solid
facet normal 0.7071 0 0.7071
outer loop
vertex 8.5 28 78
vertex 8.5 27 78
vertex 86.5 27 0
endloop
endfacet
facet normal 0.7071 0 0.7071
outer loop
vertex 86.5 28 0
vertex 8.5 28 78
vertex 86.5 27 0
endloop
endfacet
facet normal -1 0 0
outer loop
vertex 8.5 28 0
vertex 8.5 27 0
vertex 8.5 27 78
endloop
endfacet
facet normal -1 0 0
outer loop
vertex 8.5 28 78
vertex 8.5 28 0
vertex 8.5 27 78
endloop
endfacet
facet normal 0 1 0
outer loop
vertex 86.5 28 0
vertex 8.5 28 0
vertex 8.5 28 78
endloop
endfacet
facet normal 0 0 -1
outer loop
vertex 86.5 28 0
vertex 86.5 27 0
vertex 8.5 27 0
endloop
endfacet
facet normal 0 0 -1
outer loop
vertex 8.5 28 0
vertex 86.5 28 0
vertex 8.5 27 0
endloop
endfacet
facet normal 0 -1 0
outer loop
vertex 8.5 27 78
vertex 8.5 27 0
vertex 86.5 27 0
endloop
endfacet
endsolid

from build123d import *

# Parameters (mm, degrees)
BOSS_EXTRUDE1_DEPTH   = 327.5
BOSS_EXTRUDE1_2_DEPTH = 327.5
BOSS_EXTRUDE2_DEPTH   = 2
BOSS_EXTRUDE4_DEPTH   = 1
SKETCH4_W             = 100
SKETCH4_H             = 8.5
BOSS_EXTRUDE5_DEPTH   = 2
BOSS_EXTRUDE6_DEPTH   = 1
SKETCH7_R             = 5
SKETCH7_W             = 96
SKETCH7_H             = 1
CUT_EXTRUDE2_DEPTH    = 1
SKETCH8_W             = 100
SKETCH8_H             = 13.5
CUT_EXTRUDE3_DEPTH    = 400
SKETCH9_W             = 1
SKETCH9_H             = 5
CUT_EXTRUDE4_DEPTH    = 84.5
BOSS_EXTRUDE8_DEPTH   = 1
SKETCH15_W            = 110.261376908
SKETCH15_H            = 36.265100391
CUT_EXTRUDE7_DEPTH    = 400


with BuildPart() as part:
    # Sketch1 → Boss-Extrude1 (new body)
    with BuildSketch(Plane.XY):
        Polygon((0, 0), (0, 8.5), (1, 8.5), (1, 13.5), (2, 13.5), (2, 2), (13.5, 2), (13.5, 1), (8.5, 1), (8.5, 0), align=None)
    extrude(amount=BOSS_EXTRUDE1_DEPTH)



with BuildPart() as body_2:
    # Sketch1 → Boss-Extrude1 2 (new body)
    with BuildSketch(Plane.XY):
        Polygon((100, 0), (91.5, 0), (91.5, 1), (86.5, 1), (86.5, 2), (98, 2), (98, 13.5), (99, 13.5), (99, 8.5), (100, 8.5), align=None)
    extrude(amount=BOSS_EXTRUDE1_2_DEPTH)


with BuildPart() as part_1:
    add(part.part)

    add(body_2.part)  # Boss-Extrude2 merges body 2
    # Sketch2 → Boss-Extrude2 (add)
    with BuildSketch(Plane(origin=(0, 2, 0), x_dir=(1, 0, 0), z_dir=(0, 1, 0))):
        Polygon((86.5, 0), (13.5, -73), (13.5, -85.02081528), (86.5, -12.02081528), align=None)
    extrude(amount=-BOSS_EXTRUDE2_DEPTH)

    # Sketch3 → Boss-Extrude4 (add)
    with BuildSketch(Plane.XZ.offset(-1)):
        Polygon((13.5, 73), (13.5, 85.02081528), (8.5, 90.02081528), (8.5, 78), align=None)
        Polygon((86.5, 0), (86.5, 12.02081528), (91.5, 7.02081528), (91.5, 0), align=None)
    extrude(amount=BOSS_EXTRUDE4_DEPTH)

    # Sketch4 → Boss-Extrude5 (add)
    with BuildSketch(Plane.XZ):
        with Locations((50, 323.25)):
            Rectangle(SKETCH4_W, SKETCH4_H)
    extrude(amount=-BOSS_EXTRUDE5_DEPTH)

    # Sketch7 → Cut-Extrude2 (cut)
    with BuildSketch(Plane(origin=(0, 2, 0), x_dir=(1, 0, 0), z_dir=(0, 1, 0))):
        with Locations((26.5, -326.5)):
            Circle(SKETCH7_R)
        with Locations((73.5, -326.5)):
            Circle(SKETCH7_R)
        with Locations((50, -327)):
            Rectangle(SKETCH7_W, SKETCH7_H)
    extrude(amount=-CUT_EXTRUDE2_DEPTH, mode=Mode.SUBTRACT)


with BuildPart() as body_2_2:
    # Sketch5 → Boss-Extrude6 (new body)
    with BuildSketch(Plane(origin=(0, 2, 0), x_dir=(1, 0, 0), z_dir=(0, 1, 0))):
        Polygon((13.5, -65.928932188), (79.428932188, 0), (86.5, 0), (13.5, -73), align=None)
    extrude(amount=-BOSS_EXTRUDE6_DEPTH)


with BuildPart() as body_3:
    # Mirror1: mirrored copy
    add(body_2_2.part.mirror(Plane(origin=(1, 13.5, 327.5), x_dir=(0, 0, 1), z_dir=(0, -1, 0))))


with BuildPart() as body_4:
    # Mirror1 2: mirrored copy
    add(part_1.part.mirror(Plane(origin=(1, 13.5, 327.5), x_dir=(0, 0, 1), z_dir=(0, -1, 0))))

    # Sketch9 → Cut-Extrude4 (cut)
    with BuildSketch(Plane(origin=(0, 0, 0), x_dir=(-1, 0, 0), z_dir=(0, 0, -1))):
        with Locations((-1.5, 16)):
            Rectangle(SKETCH9_W, SKETCH9_H)
    extrude(amount=-CUT_EXTRUDE4_DEPTH, mode=Mode.SUBTRACT)


with BuildPart() as cut_extrude3_tool:
    # Sketch8 → Cut-Extrude3 (new body)
    with BuildSketch(Plane(origin=(0, 0, 0), x_dir=(-1, 0, 0), z_dir=(0, 0, -1))):
        with Locations((-50, 6.75)):
            Rectangle(SKETCH8_W, SKETCH8_H)
    extrude(amount=-CUT_EXTRUDE3_DEPTH)


with BuildPart() as part_2:
    add(part_1.part)

    # Cut-Extrude3: cut by cut_extrude3_tool
    add(cut_extrude3_tool.part, mode=Mode.SUBTRACT)


with BuildPart() as body_2_2_1:
    add(body_2_2.part)

    # Cut-Extrude3: cut by cut_extrude3_tool
    add(cut_extrude3_tool.part, mode=Mode.SUBTRACT)


with BuildPart() as body_3_2:
    # Sketch14 → Boss-Extrude8 (new body)
    with BuildSketch(Plane(origin=(0, 27, 0), x_dir=(1, 0, 0), z_dir=(0, 1, 0))):
        Polygon((8.5, 0), (8.5, -78), (86.5, 0), align=None)
    extrude(amount=BOSS_EXTRUDE8_DEPTH)


with BuildPart() as cut_extrude7_tool:
    # Sketch15 → Cut-Extrude7 (new body)
    with BuildSketch(Plane(origin=(0, 0, 0), x_dir=(-1, 0, 0), z_dir=(0, 0, -1))):
        with Locations((-44.869311546, 8.867449804)):
            Rectangle(SKETCH15_W, SKETCH15_H)
    extrude(amount=-CUT_EXTRUDE7_DEPTH)


with BuildPart() as body_3_1:
    add(body_3.part)

    # Cut-Extrude7: cut by cut_extrude7_tool
    add(cut_extrude7_tool.part, mode=Mode.SUBTRACT)


with BuildPart() as body_4_1:
    add(body_4.part)

    # Cut-Extrude7: cut by cut_extrude7_tool
    add(cut_extrude7_tool.part, mode=Mode.SUBTRACT)


solid = body_3_2.part
